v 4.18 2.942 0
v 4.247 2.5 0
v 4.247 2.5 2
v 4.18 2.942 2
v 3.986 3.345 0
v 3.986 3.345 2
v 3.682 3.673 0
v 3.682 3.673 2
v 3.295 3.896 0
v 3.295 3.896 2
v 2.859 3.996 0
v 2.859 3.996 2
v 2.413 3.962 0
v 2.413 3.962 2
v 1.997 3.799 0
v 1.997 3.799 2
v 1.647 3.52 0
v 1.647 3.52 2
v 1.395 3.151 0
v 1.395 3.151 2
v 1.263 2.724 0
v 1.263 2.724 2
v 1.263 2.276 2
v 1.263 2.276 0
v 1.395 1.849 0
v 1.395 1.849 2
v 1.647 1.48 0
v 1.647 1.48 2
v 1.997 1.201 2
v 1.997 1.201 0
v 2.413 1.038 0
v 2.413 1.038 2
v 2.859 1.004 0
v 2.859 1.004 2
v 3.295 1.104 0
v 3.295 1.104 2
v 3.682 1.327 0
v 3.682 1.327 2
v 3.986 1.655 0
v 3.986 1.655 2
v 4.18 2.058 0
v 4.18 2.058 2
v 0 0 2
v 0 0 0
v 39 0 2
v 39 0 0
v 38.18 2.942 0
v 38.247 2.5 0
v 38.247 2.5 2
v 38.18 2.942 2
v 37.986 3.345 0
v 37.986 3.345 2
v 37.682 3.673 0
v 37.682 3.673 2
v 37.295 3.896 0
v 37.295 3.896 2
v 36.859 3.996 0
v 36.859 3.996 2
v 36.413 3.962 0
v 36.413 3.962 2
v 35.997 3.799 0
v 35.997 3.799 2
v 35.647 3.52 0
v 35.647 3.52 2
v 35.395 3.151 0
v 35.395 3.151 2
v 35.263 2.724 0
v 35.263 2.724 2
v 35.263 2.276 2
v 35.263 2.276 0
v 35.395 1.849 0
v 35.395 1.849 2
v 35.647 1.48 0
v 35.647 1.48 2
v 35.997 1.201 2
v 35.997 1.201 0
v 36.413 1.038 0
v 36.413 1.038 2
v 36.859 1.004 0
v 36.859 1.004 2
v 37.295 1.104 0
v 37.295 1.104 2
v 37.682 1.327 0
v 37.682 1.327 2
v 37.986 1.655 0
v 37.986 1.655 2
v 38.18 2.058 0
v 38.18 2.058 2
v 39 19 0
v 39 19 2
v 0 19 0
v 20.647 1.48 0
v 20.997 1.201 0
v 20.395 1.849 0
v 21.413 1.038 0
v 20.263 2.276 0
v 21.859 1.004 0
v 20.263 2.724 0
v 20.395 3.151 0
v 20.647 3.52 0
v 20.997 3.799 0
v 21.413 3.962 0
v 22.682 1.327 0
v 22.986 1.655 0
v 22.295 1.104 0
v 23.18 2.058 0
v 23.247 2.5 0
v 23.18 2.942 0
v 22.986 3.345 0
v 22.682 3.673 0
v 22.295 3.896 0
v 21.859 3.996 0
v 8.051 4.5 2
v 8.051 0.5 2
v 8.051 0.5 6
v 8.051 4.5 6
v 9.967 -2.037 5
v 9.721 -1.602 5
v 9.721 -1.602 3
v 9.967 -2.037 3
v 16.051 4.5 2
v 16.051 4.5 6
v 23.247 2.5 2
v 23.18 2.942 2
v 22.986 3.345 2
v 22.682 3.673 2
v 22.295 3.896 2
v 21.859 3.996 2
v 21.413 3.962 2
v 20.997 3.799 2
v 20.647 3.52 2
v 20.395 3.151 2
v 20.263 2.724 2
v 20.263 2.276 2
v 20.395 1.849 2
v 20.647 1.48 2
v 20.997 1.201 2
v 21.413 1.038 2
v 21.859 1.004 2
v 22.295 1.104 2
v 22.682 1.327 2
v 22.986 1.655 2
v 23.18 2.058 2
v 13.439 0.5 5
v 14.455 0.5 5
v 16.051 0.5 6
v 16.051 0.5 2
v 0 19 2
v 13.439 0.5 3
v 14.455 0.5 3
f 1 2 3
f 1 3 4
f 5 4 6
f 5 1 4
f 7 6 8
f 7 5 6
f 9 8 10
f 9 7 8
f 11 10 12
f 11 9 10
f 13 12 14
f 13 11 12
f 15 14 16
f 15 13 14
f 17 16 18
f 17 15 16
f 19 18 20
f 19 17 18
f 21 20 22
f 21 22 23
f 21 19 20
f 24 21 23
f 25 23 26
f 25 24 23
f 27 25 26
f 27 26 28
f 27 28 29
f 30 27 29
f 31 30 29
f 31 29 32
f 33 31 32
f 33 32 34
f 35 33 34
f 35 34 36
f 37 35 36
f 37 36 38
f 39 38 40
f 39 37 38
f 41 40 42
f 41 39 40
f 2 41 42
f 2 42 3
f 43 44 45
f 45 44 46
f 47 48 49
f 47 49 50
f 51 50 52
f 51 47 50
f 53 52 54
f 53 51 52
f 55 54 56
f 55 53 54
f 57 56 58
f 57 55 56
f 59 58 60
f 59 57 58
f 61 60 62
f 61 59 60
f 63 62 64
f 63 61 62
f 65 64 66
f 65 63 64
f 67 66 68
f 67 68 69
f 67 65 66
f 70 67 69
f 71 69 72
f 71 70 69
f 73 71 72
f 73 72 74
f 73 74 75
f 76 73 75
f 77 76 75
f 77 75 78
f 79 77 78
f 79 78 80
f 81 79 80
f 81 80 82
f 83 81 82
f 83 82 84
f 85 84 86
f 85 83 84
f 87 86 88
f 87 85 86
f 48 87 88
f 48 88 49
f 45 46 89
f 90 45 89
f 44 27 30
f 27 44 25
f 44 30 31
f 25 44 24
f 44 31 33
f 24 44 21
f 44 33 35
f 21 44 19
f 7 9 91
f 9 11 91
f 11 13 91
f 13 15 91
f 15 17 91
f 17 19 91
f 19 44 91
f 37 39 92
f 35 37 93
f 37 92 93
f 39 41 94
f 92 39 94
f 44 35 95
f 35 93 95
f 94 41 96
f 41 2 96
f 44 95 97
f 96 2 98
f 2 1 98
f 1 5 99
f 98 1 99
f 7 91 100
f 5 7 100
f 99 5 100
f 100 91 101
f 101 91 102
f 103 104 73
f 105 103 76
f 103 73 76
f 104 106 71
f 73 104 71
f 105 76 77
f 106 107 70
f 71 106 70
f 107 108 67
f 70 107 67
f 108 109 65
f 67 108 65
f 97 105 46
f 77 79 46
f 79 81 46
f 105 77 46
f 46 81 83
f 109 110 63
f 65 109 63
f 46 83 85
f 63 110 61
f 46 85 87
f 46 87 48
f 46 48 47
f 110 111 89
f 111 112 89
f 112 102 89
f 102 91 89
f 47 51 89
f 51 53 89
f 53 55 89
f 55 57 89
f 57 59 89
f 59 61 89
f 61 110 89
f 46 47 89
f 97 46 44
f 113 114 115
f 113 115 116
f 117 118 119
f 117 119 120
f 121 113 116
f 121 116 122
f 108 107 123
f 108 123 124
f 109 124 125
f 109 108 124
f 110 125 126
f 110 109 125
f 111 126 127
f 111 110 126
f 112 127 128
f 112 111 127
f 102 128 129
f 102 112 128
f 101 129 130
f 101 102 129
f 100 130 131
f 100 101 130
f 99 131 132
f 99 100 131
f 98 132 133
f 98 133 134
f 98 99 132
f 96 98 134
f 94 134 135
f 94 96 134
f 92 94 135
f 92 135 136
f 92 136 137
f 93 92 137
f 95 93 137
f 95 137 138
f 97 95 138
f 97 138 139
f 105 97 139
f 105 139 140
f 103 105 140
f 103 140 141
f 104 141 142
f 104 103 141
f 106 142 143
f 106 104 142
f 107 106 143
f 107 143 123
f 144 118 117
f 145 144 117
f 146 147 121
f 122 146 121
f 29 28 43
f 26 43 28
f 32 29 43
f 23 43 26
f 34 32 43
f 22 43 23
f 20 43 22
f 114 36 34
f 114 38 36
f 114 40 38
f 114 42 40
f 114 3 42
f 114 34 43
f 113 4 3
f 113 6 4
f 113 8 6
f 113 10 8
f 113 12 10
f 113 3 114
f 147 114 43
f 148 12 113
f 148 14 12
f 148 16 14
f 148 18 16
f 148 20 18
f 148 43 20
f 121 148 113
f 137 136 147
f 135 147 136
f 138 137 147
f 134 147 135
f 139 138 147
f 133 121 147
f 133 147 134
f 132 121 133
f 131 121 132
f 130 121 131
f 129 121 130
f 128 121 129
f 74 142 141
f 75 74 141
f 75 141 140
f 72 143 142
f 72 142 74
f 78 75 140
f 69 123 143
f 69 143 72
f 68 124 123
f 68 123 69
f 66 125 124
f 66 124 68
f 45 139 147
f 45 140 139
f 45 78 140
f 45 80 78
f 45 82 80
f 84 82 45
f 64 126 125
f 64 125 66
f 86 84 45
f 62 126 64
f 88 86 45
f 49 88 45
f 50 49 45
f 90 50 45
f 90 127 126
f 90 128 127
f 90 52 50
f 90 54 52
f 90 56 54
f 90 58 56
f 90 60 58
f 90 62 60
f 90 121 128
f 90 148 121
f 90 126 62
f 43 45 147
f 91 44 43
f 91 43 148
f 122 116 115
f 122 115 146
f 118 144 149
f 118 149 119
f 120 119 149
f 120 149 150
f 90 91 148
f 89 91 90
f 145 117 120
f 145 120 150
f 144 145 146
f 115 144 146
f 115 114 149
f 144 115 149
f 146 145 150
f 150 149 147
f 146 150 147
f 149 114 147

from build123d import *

# Parameters (mm, degrees)
F0_W     = 39
F0_H     = 19
F0_R     = 1.5
F1_DEPTH = 2
F2_W     = 8
F2_H     = 4
F3_DEPTH = 4
F6_DEPTH = 2


with BuildPart() as f1:
    # F0 (on Top) → F1 (new body)
    with BuildSketch(Plane.XY):
        with Locations((19.5, 9.5)):
            Rectangle(F0_W, F0_H)
        with Locations((2.7466891247, 2.5)):
            Circle(F0_R, mode=Mode.SUBTRACT)
        with Locations((21.7466891247, 2.5)):
            Circle(F0_R, mode=Mode.SUBTRACT)
        with Locations((36.7466891247, 2.5)):
            Circle(F0_R, mode=Mode.SUBTRACT)
    extrude(amount=F1_DEPTH)

    # F2 (on face) → F3 (join)
    with BuildSketch(Plane.XY.offset(2)):
        with Locations((12.0512238369, 2.5)):
            Rectangle(F2_W, F2_H)
    extrude(amount=F3_DEPTH)

    # F5 (on face) → F6 (join)
    with BuildSketch(Plane.XY.offset(5)):
        Polygon((15.1900717236, 0.915290064), (14.9440382274, 1.3505687319), (9.7206942123, -1.6018332224), (9.9667277085, -2.0371118903), align=None)
    extrude(amount=-F6_DEPTH)


solid = f1.part
